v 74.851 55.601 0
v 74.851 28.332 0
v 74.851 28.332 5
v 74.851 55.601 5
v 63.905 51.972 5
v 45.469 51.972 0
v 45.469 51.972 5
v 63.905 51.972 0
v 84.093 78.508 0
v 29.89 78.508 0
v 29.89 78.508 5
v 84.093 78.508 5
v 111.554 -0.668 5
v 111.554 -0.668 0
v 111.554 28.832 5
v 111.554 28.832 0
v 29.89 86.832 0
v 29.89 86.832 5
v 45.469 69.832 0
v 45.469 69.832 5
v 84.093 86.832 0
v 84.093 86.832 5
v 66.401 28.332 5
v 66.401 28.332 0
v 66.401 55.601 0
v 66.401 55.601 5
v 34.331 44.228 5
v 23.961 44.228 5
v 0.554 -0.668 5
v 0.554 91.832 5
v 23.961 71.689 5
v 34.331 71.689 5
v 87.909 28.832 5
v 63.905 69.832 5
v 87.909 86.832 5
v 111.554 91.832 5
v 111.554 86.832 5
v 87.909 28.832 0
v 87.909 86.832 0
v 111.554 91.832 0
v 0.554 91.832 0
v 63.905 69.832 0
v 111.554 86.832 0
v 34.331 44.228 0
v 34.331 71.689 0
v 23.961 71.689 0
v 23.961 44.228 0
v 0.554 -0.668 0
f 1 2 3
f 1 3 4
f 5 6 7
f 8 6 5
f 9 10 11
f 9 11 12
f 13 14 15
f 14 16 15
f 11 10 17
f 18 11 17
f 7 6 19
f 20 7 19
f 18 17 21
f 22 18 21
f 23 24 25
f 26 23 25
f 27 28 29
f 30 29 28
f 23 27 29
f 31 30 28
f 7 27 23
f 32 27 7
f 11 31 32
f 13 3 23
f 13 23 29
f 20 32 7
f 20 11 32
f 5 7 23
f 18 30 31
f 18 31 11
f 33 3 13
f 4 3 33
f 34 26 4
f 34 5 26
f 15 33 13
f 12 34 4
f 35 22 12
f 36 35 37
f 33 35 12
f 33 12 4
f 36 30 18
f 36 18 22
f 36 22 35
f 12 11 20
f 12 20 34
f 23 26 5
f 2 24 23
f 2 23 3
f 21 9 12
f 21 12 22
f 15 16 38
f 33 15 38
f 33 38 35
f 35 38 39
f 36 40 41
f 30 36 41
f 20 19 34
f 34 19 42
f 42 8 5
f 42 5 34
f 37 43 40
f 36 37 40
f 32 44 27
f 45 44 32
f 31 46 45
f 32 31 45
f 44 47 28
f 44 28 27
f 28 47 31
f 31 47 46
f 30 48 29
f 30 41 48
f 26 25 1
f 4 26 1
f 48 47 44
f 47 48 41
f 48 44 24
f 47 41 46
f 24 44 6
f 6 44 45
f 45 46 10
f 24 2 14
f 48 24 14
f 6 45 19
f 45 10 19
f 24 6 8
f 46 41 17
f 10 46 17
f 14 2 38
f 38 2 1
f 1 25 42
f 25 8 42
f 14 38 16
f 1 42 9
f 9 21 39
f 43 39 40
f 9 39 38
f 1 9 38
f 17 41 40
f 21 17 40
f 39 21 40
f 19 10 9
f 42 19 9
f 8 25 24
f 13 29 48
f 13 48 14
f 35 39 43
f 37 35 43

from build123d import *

# Parameters (mm, degrees)
CROQUIS1_W              = 54.203553954
CROQUIS1_H              = 8.324117214
CROQUIS1_W_2            = 10.370081464
CROQUIS1_H_2            = 27.461512026
CROQUIS1_W_3            = 8.449696009
CROQUIS1_H_3            = 27.269473481
CROQUIS1_W_4            = 18.435700381
CROQUIS1_H_4            = 17.859584744
SALIENTE_EXTRUIR1_DEPTH = 5
CROQUIS3_W              = 111
CROQUIS3_H              = 5
SALIENTE_EXTRUIR2_DEPTH = 6


with BuildPart() as part:
    # Croquis1 → Saliente-Extruir1 (new body)
    with BuildSketch(Plane.XY):
        Polygon((0.553582562, 91.831917191), (0.553582562, 5.331917191), (111.553582562, 5.331917191), (111.553582562, 28.831917191), (87.909456329, 28.831917191), (87.909456329, 86.831917191), (111.553582562, 86.831917191), (111.553582562, 91.831917191), align=None)
        with Locations((56.991342937, 82.669858584)):
            Rectangle(CROQUIS1_W, CROQUIS1_H, mode=Mode.SUBTRACT)
        with Locations((29.145661363, 57.958361113)):
            Rectangle(CROQUIS1_W_2, CROQUIS1_H_2, mode=Mode.SUBTRACT)
        with Locations((70.625987221, 41.966653932)):
            Rectangle(CROQUIS1_W_3, CROQUIS1_H_3, mode=Mode.SUBTRACT)
        with Locations((54.686787933, 60.902124819)):
            Rectangle(CROQUIS1_W_4, CROQUIS1_H_4, mode=Mode.SUBTRACT)
    extrude(amount=SALIENTE_EXTRUIR1_DEPTH)

    # Croquis3 → Saliente-Extruir2 (add)
    with BuildSketch(Plane.XZ.offset(-5.331917191)):
        with Locations((56.053582562, 2.5)):
            Rectangle(CROQUIS3_W, CROQUIS3_H)
    extrude(amount=SALIENTE_EXTRUIR2_DEPTH)


solid = part.part
